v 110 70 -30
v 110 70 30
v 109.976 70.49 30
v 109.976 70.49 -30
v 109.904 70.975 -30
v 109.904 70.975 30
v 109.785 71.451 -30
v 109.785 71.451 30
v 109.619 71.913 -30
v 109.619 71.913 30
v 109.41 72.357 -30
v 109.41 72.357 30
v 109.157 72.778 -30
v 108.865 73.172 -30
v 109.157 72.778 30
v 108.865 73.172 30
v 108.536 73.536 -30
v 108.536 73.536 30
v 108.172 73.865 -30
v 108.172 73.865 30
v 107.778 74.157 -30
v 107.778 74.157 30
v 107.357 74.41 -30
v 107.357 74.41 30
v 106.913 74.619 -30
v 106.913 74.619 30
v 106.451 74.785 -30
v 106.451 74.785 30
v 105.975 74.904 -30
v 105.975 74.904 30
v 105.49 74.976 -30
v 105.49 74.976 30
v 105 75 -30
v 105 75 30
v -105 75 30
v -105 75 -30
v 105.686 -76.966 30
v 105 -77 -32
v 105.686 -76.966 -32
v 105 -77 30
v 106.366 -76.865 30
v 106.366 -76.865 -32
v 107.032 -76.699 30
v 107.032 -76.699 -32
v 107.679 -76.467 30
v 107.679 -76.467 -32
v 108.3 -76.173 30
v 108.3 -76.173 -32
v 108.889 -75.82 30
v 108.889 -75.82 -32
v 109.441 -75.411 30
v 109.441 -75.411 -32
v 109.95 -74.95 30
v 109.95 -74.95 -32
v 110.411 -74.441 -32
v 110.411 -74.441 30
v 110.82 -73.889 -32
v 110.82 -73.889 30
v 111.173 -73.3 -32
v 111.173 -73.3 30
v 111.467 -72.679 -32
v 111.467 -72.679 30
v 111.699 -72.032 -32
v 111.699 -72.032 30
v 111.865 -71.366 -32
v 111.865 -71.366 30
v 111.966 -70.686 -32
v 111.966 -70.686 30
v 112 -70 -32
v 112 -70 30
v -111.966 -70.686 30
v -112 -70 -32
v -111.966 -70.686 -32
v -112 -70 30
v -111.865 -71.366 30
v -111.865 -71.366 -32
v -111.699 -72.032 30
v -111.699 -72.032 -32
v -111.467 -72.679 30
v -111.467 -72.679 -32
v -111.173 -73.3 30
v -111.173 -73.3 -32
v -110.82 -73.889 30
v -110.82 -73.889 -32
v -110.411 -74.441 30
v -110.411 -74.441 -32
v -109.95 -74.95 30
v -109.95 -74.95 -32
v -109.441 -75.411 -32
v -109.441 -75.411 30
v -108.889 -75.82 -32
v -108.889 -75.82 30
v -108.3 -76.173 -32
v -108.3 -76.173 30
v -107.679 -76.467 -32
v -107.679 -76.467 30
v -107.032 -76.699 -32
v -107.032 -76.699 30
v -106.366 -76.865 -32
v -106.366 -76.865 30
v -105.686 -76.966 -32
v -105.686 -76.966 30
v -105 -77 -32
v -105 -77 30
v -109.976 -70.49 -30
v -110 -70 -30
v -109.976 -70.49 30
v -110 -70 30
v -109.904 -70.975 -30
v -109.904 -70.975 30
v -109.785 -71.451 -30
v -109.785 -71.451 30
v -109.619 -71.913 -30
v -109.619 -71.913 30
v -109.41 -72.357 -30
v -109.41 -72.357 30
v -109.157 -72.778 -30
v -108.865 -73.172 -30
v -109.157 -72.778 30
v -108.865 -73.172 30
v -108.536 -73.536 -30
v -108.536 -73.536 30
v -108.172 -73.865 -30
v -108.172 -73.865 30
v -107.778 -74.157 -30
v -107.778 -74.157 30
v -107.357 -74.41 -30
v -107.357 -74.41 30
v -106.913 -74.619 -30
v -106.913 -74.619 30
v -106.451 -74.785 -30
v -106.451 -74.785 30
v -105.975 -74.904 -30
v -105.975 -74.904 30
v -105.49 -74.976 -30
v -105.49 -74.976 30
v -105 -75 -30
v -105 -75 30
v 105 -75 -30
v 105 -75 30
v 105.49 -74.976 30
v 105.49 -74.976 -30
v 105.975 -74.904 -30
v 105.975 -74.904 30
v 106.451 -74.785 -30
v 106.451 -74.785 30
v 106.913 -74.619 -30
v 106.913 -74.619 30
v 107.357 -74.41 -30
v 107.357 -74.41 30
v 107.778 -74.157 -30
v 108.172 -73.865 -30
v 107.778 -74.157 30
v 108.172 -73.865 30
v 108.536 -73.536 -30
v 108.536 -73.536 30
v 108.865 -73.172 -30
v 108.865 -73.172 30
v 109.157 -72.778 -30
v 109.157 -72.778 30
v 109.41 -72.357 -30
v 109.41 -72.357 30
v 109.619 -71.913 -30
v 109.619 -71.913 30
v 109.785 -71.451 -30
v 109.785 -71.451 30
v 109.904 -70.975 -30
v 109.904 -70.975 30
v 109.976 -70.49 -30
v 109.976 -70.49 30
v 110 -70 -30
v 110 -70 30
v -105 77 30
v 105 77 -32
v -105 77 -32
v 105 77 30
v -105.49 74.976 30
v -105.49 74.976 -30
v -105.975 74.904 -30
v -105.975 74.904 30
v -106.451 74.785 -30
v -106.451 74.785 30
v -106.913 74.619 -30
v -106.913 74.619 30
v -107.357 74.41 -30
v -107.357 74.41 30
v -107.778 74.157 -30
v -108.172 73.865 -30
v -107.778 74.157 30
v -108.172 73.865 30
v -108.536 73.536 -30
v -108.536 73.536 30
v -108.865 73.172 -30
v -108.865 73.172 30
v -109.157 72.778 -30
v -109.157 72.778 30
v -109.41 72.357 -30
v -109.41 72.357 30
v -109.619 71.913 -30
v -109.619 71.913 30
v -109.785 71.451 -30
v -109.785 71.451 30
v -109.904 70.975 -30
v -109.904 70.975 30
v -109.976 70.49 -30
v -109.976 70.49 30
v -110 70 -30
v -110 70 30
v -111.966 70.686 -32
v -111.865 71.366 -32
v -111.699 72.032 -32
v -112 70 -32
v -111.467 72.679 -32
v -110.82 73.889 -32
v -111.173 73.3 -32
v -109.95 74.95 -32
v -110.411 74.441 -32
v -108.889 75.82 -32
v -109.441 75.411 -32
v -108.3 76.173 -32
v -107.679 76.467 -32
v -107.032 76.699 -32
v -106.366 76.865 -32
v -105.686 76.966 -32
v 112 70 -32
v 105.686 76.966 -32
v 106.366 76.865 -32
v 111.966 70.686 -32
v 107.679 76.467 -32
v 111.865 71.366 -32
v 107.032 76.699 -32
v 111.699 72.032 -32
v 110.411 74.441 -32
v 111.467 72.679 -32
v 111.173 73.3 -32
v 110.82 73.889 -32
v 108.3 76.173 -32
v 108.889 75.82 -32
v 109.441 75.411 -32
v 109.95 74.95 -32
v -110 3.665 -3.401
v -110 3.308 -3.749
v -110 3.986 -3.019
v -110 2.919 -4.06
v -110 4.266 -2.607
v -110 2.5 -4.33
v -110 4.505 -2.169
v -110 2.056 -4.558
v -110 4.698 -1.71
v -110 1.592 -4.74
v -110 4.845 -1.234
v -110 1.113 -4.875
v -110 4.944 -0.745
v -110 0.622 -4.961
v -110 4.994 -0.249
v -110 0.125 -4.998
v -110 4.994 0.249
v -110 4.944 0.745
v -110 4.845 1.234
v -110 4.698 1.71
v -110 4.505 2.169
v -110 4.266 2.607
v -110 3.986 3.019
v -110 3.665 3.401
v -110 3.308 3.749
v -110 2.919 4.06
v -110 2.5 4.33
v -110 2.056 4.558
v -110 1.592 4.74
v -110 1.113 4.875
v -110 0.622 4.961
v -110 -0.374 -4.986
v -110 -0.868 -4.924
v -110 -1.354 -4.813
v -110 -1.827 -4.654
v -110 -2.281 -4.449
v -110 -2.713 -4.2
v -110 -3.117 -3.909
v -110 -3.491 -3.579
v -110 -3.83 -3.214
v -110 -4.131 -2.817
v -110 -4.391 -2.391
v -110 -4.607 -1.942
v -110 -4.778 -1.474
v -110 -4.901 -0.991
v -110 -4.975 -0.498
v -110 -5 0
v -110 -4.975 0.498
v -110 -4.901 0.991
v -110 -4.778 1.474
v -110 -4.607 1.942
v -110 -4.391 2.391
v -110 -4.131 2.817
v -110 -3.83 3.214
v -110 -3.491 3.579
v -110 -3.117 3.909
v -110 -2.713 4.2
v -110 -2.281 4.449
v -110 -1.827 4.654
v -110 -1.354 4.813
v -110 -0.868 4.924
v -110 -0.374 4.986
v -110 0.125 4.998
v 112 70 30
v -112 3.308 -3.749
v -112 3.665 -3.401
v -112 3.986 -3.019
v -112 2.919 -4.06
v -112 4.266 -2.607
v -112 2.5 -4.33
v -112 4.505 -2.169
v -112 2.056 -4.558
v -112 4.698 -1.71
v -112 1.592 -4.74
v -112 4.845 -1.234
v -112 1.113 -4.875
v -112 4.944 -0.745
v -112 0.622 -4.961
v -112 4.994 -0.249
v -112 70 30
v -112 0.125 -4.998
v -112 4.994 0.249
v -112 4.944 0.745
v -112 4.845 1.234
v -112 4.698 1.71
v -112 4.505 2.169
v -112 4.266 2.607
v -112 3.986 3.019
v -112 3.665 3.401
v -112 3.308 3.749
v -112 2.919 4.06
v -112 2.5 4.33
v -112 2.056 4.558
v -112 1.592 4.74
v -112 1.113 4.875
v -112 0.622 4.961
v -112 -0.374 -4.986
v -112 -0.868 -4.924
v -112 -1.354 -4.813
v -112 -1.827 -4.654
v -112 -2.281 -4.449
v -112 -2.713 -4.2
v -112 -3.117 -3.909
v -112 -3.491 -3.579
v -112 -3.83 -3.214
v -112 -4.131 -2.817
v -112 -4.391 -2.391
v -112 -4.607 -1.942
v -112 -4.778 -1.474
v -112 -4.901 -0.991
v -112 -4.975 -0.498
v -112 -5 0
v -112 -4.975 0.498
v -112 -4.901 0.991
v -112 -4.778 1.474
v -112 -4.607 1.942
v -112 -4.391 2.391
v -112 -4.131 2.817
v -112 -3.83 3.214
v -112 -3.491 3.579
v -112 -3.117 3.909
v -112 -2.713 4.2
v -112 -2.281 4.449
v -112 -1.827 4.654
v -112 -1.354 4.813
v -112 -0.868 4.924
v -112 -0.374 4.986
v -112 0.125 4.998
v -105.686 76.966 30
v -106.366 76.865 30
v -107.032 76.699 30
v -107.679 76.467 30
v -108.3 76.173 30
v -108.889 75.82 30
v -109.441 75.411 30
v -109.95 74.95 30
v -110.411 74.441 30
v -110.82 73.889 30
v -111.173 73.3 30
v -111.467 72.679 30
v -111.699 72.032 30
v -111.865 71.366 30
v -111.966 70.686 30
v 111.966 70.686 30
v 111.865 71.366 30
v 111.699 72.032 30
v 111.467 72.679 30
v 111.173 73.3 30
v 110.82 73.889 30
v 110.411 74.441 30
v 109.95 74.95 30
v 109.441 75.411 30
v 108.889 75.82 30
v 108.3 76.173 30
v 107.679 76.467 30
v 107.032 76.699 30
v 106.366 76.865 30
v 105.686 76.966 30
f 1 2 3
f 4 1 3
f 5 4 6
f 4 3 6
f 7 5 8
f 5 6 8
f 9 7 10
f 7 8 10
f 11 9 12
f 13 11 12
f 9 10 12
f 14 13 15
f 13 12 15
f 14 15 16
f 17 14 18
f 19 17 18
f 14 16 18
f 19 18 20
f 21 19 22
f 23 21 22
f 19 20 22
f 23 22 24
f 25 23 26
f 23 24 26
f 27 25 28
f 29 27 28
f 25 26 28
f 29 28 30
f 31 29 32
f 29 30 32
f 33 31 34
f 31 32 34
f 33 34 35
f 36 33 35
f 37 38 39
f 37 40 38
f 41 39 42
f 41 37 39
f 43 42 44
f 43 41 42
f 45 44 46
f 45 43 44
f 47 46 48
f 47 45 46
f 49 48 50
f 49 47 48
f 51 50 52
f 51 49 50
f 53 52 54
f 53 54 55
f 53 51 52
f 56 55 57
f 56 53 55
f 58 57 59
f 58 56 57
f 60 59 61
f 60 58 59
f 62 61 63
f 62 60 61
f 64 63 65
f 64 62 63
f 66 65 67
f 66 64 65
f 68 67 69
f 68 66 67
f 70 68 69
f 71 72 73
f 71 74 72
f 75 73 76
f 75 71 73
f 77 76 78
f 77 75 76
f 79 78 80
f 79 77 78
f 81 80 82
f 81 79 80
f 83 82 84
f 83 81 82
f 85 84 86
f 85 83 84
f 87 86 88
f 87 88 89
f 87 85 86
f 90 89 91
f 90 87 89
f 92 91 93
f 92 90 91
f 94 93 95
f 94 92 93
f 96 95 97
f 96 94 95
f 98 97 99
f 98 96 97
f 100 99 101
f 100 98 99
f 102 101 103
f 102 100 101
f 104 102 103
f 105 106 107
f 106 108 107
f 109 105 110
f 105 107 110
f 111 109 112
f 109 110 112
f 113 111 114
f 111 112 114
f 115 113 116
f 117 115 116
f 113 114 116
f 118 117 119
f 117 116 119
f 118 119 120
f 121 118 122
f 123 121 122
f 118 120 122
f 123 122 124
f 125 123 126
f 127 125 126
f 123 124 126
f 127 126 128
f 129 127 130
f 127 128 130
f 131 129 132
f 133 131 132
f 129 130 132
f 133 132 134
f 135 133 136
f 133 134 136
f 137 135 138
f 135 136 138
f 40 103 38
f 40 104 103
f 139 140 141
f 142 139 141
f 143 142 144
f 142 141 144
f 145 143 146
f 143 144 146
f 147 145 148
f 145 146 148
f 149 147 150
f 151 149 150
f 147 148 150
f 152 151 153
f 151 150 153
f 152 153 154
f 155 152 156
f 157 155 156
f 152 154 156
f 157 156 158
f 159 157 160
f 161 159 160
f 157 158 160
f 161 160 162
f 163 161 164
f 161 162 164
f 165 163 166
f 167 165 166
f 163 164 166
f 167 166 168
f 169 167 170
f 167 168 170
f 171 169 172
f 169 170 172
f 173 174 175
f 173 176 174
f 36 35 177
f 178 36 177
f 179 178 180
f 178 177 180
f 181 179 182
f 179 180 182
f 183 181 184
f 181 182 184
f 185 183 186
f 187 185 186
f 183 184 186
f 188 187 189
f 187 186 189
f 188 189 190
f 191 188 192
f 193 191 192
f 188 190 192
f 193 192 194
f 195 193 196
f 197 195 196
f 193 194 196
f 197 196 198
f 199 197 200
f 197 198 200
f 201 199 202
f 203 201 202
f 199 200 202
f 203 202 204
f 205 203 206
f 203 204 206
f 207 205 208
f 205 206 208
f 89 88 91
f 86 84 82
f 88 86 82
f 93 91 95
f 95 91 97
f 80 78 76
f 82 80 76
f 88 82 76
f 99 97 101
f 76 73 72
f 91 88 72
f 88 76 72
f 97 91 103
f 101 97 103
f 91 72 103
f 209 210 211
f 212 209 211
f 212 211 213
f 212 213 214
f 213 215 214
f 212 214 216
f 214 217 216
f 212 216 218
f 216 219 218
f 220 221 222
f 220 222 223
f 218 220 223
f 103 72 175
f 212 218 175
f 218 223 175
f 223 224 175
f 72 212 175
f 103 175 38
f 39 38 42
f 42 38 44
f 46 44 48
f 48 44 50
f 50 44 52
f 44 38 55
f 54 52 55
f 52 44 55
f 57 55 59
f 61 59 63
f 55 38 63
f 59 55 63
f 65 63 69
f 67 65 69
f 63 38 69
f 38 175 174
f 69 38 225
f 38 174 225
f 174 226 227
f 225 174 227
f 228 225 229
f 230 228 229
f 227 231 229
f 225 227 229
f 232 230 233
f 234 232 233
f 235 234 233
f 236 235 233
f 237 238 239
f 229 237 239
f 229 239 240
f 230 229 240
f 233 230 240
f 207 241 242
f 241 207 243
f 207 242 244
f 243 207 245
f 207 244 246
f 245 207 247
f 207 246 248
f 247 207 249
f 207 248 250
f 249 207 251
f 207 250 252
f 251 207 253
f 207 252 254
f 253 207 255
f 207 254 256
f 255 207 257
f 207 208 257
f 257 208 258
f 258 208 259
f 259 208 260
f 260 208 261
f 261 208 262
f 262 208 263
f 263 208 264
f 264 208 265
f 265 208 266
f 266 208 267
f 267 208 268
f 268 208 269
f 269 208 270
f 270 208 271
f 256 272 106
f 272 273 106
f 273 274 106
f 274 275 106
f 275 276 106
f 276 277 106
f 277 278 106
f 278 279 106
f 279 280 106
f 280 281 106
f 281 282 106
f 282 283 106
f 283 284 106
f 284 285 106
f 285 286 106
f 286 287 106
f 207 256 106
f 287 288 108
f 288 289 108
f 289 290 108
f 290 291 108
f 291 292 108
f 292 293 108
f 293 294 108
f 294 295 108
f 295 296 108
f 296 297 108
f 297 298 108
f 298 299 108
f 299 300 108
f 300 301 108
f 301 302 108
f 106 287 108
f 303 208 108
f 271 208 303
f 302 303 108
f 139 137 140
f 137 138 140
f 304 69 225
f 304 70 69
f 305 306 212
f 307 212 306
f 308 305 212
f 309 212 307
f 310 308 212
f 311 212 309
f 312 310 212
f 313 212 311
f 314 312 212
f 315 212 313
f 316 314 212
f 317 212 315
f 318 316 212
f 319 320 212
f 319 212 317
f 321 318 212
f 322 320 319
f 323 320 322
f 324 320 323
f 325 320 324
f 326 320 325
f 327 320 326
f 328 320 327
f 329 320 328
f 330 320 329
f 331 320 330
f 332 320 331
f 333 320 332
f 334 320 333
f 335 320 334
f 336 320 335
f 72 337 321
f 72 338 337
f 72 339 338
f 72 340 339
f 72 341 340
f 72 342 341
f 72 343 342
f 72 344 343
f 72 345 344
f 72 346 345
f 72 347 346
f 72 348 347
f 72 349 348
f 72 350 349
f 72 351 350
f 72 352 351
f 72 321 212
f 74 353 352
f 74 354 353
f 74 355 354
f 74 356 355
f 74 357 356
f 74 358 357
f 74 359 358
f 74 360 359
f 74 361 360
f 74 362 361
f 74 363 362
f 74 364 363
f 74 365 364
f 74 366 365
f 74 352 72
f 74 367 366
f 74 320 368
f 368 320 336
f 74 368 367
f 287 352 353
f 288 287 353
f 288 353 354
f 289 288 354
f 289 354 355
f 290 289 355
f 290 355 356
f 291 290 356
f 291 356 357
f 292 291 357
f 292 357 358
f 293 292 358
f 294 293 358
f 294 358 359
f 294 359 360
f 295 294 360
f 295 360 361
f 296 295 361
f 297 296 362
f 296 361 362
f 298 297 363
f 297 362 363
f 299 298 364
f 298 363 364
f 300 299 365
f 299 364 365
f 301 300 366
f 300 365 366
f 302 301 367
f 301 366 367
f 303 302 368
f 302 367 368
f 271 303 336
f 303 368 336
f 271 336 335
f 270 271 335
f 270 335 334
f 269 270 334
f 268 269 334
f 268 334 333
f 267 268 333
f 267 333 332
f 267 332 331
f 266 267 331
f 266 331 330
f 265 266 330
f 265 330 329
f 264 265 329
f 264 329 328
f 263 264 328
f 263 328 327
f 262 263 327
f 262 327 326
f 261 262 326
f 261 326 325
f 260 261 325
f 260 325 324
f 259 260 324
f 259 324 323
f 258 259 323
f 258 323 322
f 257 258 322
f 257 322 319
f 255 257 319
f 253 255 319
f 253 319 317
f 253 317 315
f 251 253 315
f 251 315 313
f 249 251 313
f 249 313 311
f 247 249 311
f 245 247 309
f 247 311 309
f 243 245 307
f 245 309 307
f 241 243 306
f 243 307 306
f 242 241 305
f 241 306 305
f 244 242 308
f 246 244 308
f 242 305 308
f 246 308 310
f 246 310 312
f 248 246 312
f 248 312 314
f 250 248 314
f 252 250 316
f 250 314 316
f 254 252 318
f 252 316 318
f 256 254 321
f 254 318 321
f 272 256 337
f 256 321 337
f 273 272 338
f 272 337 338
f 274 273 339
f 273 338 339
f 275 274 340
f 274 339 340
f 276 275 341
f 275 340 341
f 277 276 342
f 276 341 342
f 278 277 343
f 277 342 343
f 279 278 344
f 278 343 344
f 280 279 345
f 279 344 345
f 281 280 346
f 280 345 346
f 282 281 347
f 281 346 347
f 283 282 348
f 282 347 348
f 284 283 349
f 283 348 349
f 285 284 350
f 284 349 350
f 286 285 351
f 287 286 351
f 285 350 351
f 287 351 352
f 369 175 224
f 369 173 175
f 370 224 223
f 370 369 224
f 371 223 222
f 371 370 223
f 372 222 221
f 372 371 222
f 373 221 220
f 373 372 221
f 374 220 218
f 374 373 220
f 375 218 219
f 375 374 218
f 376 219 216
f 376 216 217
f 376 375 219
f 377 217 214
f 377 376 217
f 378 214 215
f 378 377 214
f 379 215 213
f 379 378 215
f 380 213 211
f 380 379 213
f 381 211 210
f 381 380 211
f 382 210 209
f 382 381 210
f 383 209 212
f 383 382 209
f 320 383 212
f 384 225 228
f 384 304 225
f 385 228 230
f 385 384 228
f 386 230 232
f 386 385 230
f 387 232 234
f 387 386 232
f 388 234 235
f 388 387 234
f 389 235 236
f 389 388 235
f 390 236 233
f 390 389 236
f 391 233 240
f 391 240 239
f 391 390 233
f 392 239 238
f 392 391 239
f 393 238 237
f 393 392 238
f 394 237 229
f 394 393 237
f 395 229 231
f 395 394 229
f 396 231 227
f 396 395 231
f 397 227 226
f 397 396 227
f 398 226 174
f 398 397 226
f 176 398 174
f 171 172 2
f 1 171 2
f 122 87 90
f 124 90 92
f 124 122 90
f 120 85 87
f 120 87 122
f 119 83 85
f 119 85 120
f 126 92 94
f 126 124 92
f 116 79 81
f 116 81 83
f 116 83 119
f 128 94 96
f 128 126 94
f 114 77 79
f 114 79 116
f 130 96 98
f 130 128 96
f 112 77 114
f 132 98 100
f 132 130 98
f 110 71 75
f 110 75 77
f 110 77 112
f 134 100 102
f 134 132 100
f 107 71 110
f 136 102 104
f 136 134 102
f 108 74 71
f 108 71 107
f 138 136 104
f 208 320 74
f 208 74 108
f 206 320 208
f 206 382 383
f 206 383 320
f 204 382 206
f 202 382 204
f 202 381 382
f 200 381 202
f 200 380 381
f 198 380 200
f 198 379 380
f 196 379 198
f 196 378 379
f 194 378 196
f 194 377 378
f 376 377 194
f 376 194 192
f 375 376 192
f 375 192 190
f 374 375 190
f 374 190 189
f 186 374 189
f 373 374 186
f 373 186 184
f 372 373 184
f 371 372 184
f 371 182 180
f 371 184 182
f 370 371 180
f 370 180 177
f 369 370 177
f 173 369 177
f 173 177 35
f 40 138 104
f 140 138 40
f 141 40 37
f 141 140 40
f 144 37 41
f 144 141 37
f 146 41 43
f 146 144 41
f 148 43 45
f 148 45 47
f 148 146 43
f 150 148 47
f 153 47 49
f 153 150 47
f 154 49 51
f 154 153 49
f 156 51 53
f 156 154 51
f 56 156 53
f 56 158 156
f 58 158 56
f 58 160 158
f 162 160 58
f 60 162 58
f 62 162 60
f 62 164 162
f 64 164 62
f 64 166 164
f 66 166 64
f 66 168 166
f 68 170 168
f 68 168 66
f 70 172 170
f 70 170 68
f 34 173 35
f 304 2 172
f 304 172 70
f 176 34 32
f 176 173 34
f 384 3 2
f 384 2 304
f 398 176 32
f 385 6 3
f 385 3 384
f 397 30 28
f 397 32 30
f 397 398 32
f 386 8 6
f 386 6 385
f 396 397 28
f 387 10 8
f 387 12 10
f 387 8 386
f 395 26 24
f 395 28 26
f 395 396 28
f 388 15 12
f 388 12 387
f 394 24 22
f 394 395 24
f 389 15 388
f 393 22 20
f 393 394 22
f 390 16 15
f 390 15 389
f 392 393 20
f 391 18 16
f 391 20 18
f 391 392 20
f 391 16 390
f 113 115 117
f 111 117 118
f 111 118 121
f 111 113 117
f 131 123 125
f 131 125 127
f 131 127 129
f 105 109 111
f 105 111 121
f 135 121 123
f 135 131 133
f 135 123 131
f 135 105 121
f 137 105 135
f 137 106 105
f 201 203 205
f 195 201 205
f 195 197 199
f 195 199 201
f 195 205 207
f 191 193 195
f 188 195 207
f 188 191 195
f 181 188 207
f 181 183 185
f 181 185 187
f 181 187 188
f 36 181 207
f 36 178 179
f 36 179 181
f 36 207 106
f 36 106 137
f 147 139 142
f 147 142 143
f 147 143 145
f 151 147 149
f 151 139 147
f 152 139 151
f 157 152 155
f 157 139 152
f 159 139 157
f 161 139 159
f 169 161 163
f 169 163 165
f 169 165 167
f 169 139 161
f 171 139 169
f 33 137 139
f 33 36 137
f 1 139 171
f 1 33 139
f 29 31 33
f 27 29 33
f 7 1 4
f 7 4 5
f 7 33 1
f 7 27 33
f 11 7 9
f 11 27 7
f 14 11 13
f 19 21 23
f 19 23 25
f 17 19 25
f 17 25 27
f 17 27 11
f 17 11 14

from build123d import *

# Parameters (mm, degrees)
BOSS_EXTRUDE1_DEPTH = 30
SHELL1_T            = 2
SKETCH2_R           = 5
CUT_EXTRUDE1_DEPTH  = 50


with BuildPart() as part:
    # Sketch1 → Boss-Extrude1 (new, symmetric)
    with BuildSketch(Plane.XY):
        with BuildLine():
            Line((-105, -75), (105, -75))
            ThreePointArc((105, -75), (108.535533906, -73.535533906), (110, -70))
            Line((110, -70), (110, 70))
            ThreePointArc((110, 70), (108.535533906, 73.535533906), (105, 75))
            Line((105, 75), (-105, 75))
            ThreePointArc((-105, 75), (-108.535533906, 73.535533906), (-110, 70))
            Line((-110, 70), (-110, -70))
            ThreePointArc((-110, -70), (-108.535533906, -73.535533906), (-105, -75))
        make_face()
    extrude(amount=BOSS_EXTRUDE1_DEPTH, both=True)

    # Shell1
    shell1_openings = [part.faces().sort_by_distance(p)[0] for p in [
        (0, 0, 30),
    ]]
    offset(amount=SHELL1_T, openings=shell1_openings, kind=Kind.INTERSECTION)

    # Sketch2 → Cut-Extrude1 (cut)
    with BuildSketch(Plane.ZY.offset(112)):
        with Locations(Location((0, 0, 0), (0, 0, 270))):
            Circle(SKETCH2_R)
    extrude(amount=-CUT_EXTRUDE1_DEPTH, mode=Mode.SUBTRACT)


solid = part.part
